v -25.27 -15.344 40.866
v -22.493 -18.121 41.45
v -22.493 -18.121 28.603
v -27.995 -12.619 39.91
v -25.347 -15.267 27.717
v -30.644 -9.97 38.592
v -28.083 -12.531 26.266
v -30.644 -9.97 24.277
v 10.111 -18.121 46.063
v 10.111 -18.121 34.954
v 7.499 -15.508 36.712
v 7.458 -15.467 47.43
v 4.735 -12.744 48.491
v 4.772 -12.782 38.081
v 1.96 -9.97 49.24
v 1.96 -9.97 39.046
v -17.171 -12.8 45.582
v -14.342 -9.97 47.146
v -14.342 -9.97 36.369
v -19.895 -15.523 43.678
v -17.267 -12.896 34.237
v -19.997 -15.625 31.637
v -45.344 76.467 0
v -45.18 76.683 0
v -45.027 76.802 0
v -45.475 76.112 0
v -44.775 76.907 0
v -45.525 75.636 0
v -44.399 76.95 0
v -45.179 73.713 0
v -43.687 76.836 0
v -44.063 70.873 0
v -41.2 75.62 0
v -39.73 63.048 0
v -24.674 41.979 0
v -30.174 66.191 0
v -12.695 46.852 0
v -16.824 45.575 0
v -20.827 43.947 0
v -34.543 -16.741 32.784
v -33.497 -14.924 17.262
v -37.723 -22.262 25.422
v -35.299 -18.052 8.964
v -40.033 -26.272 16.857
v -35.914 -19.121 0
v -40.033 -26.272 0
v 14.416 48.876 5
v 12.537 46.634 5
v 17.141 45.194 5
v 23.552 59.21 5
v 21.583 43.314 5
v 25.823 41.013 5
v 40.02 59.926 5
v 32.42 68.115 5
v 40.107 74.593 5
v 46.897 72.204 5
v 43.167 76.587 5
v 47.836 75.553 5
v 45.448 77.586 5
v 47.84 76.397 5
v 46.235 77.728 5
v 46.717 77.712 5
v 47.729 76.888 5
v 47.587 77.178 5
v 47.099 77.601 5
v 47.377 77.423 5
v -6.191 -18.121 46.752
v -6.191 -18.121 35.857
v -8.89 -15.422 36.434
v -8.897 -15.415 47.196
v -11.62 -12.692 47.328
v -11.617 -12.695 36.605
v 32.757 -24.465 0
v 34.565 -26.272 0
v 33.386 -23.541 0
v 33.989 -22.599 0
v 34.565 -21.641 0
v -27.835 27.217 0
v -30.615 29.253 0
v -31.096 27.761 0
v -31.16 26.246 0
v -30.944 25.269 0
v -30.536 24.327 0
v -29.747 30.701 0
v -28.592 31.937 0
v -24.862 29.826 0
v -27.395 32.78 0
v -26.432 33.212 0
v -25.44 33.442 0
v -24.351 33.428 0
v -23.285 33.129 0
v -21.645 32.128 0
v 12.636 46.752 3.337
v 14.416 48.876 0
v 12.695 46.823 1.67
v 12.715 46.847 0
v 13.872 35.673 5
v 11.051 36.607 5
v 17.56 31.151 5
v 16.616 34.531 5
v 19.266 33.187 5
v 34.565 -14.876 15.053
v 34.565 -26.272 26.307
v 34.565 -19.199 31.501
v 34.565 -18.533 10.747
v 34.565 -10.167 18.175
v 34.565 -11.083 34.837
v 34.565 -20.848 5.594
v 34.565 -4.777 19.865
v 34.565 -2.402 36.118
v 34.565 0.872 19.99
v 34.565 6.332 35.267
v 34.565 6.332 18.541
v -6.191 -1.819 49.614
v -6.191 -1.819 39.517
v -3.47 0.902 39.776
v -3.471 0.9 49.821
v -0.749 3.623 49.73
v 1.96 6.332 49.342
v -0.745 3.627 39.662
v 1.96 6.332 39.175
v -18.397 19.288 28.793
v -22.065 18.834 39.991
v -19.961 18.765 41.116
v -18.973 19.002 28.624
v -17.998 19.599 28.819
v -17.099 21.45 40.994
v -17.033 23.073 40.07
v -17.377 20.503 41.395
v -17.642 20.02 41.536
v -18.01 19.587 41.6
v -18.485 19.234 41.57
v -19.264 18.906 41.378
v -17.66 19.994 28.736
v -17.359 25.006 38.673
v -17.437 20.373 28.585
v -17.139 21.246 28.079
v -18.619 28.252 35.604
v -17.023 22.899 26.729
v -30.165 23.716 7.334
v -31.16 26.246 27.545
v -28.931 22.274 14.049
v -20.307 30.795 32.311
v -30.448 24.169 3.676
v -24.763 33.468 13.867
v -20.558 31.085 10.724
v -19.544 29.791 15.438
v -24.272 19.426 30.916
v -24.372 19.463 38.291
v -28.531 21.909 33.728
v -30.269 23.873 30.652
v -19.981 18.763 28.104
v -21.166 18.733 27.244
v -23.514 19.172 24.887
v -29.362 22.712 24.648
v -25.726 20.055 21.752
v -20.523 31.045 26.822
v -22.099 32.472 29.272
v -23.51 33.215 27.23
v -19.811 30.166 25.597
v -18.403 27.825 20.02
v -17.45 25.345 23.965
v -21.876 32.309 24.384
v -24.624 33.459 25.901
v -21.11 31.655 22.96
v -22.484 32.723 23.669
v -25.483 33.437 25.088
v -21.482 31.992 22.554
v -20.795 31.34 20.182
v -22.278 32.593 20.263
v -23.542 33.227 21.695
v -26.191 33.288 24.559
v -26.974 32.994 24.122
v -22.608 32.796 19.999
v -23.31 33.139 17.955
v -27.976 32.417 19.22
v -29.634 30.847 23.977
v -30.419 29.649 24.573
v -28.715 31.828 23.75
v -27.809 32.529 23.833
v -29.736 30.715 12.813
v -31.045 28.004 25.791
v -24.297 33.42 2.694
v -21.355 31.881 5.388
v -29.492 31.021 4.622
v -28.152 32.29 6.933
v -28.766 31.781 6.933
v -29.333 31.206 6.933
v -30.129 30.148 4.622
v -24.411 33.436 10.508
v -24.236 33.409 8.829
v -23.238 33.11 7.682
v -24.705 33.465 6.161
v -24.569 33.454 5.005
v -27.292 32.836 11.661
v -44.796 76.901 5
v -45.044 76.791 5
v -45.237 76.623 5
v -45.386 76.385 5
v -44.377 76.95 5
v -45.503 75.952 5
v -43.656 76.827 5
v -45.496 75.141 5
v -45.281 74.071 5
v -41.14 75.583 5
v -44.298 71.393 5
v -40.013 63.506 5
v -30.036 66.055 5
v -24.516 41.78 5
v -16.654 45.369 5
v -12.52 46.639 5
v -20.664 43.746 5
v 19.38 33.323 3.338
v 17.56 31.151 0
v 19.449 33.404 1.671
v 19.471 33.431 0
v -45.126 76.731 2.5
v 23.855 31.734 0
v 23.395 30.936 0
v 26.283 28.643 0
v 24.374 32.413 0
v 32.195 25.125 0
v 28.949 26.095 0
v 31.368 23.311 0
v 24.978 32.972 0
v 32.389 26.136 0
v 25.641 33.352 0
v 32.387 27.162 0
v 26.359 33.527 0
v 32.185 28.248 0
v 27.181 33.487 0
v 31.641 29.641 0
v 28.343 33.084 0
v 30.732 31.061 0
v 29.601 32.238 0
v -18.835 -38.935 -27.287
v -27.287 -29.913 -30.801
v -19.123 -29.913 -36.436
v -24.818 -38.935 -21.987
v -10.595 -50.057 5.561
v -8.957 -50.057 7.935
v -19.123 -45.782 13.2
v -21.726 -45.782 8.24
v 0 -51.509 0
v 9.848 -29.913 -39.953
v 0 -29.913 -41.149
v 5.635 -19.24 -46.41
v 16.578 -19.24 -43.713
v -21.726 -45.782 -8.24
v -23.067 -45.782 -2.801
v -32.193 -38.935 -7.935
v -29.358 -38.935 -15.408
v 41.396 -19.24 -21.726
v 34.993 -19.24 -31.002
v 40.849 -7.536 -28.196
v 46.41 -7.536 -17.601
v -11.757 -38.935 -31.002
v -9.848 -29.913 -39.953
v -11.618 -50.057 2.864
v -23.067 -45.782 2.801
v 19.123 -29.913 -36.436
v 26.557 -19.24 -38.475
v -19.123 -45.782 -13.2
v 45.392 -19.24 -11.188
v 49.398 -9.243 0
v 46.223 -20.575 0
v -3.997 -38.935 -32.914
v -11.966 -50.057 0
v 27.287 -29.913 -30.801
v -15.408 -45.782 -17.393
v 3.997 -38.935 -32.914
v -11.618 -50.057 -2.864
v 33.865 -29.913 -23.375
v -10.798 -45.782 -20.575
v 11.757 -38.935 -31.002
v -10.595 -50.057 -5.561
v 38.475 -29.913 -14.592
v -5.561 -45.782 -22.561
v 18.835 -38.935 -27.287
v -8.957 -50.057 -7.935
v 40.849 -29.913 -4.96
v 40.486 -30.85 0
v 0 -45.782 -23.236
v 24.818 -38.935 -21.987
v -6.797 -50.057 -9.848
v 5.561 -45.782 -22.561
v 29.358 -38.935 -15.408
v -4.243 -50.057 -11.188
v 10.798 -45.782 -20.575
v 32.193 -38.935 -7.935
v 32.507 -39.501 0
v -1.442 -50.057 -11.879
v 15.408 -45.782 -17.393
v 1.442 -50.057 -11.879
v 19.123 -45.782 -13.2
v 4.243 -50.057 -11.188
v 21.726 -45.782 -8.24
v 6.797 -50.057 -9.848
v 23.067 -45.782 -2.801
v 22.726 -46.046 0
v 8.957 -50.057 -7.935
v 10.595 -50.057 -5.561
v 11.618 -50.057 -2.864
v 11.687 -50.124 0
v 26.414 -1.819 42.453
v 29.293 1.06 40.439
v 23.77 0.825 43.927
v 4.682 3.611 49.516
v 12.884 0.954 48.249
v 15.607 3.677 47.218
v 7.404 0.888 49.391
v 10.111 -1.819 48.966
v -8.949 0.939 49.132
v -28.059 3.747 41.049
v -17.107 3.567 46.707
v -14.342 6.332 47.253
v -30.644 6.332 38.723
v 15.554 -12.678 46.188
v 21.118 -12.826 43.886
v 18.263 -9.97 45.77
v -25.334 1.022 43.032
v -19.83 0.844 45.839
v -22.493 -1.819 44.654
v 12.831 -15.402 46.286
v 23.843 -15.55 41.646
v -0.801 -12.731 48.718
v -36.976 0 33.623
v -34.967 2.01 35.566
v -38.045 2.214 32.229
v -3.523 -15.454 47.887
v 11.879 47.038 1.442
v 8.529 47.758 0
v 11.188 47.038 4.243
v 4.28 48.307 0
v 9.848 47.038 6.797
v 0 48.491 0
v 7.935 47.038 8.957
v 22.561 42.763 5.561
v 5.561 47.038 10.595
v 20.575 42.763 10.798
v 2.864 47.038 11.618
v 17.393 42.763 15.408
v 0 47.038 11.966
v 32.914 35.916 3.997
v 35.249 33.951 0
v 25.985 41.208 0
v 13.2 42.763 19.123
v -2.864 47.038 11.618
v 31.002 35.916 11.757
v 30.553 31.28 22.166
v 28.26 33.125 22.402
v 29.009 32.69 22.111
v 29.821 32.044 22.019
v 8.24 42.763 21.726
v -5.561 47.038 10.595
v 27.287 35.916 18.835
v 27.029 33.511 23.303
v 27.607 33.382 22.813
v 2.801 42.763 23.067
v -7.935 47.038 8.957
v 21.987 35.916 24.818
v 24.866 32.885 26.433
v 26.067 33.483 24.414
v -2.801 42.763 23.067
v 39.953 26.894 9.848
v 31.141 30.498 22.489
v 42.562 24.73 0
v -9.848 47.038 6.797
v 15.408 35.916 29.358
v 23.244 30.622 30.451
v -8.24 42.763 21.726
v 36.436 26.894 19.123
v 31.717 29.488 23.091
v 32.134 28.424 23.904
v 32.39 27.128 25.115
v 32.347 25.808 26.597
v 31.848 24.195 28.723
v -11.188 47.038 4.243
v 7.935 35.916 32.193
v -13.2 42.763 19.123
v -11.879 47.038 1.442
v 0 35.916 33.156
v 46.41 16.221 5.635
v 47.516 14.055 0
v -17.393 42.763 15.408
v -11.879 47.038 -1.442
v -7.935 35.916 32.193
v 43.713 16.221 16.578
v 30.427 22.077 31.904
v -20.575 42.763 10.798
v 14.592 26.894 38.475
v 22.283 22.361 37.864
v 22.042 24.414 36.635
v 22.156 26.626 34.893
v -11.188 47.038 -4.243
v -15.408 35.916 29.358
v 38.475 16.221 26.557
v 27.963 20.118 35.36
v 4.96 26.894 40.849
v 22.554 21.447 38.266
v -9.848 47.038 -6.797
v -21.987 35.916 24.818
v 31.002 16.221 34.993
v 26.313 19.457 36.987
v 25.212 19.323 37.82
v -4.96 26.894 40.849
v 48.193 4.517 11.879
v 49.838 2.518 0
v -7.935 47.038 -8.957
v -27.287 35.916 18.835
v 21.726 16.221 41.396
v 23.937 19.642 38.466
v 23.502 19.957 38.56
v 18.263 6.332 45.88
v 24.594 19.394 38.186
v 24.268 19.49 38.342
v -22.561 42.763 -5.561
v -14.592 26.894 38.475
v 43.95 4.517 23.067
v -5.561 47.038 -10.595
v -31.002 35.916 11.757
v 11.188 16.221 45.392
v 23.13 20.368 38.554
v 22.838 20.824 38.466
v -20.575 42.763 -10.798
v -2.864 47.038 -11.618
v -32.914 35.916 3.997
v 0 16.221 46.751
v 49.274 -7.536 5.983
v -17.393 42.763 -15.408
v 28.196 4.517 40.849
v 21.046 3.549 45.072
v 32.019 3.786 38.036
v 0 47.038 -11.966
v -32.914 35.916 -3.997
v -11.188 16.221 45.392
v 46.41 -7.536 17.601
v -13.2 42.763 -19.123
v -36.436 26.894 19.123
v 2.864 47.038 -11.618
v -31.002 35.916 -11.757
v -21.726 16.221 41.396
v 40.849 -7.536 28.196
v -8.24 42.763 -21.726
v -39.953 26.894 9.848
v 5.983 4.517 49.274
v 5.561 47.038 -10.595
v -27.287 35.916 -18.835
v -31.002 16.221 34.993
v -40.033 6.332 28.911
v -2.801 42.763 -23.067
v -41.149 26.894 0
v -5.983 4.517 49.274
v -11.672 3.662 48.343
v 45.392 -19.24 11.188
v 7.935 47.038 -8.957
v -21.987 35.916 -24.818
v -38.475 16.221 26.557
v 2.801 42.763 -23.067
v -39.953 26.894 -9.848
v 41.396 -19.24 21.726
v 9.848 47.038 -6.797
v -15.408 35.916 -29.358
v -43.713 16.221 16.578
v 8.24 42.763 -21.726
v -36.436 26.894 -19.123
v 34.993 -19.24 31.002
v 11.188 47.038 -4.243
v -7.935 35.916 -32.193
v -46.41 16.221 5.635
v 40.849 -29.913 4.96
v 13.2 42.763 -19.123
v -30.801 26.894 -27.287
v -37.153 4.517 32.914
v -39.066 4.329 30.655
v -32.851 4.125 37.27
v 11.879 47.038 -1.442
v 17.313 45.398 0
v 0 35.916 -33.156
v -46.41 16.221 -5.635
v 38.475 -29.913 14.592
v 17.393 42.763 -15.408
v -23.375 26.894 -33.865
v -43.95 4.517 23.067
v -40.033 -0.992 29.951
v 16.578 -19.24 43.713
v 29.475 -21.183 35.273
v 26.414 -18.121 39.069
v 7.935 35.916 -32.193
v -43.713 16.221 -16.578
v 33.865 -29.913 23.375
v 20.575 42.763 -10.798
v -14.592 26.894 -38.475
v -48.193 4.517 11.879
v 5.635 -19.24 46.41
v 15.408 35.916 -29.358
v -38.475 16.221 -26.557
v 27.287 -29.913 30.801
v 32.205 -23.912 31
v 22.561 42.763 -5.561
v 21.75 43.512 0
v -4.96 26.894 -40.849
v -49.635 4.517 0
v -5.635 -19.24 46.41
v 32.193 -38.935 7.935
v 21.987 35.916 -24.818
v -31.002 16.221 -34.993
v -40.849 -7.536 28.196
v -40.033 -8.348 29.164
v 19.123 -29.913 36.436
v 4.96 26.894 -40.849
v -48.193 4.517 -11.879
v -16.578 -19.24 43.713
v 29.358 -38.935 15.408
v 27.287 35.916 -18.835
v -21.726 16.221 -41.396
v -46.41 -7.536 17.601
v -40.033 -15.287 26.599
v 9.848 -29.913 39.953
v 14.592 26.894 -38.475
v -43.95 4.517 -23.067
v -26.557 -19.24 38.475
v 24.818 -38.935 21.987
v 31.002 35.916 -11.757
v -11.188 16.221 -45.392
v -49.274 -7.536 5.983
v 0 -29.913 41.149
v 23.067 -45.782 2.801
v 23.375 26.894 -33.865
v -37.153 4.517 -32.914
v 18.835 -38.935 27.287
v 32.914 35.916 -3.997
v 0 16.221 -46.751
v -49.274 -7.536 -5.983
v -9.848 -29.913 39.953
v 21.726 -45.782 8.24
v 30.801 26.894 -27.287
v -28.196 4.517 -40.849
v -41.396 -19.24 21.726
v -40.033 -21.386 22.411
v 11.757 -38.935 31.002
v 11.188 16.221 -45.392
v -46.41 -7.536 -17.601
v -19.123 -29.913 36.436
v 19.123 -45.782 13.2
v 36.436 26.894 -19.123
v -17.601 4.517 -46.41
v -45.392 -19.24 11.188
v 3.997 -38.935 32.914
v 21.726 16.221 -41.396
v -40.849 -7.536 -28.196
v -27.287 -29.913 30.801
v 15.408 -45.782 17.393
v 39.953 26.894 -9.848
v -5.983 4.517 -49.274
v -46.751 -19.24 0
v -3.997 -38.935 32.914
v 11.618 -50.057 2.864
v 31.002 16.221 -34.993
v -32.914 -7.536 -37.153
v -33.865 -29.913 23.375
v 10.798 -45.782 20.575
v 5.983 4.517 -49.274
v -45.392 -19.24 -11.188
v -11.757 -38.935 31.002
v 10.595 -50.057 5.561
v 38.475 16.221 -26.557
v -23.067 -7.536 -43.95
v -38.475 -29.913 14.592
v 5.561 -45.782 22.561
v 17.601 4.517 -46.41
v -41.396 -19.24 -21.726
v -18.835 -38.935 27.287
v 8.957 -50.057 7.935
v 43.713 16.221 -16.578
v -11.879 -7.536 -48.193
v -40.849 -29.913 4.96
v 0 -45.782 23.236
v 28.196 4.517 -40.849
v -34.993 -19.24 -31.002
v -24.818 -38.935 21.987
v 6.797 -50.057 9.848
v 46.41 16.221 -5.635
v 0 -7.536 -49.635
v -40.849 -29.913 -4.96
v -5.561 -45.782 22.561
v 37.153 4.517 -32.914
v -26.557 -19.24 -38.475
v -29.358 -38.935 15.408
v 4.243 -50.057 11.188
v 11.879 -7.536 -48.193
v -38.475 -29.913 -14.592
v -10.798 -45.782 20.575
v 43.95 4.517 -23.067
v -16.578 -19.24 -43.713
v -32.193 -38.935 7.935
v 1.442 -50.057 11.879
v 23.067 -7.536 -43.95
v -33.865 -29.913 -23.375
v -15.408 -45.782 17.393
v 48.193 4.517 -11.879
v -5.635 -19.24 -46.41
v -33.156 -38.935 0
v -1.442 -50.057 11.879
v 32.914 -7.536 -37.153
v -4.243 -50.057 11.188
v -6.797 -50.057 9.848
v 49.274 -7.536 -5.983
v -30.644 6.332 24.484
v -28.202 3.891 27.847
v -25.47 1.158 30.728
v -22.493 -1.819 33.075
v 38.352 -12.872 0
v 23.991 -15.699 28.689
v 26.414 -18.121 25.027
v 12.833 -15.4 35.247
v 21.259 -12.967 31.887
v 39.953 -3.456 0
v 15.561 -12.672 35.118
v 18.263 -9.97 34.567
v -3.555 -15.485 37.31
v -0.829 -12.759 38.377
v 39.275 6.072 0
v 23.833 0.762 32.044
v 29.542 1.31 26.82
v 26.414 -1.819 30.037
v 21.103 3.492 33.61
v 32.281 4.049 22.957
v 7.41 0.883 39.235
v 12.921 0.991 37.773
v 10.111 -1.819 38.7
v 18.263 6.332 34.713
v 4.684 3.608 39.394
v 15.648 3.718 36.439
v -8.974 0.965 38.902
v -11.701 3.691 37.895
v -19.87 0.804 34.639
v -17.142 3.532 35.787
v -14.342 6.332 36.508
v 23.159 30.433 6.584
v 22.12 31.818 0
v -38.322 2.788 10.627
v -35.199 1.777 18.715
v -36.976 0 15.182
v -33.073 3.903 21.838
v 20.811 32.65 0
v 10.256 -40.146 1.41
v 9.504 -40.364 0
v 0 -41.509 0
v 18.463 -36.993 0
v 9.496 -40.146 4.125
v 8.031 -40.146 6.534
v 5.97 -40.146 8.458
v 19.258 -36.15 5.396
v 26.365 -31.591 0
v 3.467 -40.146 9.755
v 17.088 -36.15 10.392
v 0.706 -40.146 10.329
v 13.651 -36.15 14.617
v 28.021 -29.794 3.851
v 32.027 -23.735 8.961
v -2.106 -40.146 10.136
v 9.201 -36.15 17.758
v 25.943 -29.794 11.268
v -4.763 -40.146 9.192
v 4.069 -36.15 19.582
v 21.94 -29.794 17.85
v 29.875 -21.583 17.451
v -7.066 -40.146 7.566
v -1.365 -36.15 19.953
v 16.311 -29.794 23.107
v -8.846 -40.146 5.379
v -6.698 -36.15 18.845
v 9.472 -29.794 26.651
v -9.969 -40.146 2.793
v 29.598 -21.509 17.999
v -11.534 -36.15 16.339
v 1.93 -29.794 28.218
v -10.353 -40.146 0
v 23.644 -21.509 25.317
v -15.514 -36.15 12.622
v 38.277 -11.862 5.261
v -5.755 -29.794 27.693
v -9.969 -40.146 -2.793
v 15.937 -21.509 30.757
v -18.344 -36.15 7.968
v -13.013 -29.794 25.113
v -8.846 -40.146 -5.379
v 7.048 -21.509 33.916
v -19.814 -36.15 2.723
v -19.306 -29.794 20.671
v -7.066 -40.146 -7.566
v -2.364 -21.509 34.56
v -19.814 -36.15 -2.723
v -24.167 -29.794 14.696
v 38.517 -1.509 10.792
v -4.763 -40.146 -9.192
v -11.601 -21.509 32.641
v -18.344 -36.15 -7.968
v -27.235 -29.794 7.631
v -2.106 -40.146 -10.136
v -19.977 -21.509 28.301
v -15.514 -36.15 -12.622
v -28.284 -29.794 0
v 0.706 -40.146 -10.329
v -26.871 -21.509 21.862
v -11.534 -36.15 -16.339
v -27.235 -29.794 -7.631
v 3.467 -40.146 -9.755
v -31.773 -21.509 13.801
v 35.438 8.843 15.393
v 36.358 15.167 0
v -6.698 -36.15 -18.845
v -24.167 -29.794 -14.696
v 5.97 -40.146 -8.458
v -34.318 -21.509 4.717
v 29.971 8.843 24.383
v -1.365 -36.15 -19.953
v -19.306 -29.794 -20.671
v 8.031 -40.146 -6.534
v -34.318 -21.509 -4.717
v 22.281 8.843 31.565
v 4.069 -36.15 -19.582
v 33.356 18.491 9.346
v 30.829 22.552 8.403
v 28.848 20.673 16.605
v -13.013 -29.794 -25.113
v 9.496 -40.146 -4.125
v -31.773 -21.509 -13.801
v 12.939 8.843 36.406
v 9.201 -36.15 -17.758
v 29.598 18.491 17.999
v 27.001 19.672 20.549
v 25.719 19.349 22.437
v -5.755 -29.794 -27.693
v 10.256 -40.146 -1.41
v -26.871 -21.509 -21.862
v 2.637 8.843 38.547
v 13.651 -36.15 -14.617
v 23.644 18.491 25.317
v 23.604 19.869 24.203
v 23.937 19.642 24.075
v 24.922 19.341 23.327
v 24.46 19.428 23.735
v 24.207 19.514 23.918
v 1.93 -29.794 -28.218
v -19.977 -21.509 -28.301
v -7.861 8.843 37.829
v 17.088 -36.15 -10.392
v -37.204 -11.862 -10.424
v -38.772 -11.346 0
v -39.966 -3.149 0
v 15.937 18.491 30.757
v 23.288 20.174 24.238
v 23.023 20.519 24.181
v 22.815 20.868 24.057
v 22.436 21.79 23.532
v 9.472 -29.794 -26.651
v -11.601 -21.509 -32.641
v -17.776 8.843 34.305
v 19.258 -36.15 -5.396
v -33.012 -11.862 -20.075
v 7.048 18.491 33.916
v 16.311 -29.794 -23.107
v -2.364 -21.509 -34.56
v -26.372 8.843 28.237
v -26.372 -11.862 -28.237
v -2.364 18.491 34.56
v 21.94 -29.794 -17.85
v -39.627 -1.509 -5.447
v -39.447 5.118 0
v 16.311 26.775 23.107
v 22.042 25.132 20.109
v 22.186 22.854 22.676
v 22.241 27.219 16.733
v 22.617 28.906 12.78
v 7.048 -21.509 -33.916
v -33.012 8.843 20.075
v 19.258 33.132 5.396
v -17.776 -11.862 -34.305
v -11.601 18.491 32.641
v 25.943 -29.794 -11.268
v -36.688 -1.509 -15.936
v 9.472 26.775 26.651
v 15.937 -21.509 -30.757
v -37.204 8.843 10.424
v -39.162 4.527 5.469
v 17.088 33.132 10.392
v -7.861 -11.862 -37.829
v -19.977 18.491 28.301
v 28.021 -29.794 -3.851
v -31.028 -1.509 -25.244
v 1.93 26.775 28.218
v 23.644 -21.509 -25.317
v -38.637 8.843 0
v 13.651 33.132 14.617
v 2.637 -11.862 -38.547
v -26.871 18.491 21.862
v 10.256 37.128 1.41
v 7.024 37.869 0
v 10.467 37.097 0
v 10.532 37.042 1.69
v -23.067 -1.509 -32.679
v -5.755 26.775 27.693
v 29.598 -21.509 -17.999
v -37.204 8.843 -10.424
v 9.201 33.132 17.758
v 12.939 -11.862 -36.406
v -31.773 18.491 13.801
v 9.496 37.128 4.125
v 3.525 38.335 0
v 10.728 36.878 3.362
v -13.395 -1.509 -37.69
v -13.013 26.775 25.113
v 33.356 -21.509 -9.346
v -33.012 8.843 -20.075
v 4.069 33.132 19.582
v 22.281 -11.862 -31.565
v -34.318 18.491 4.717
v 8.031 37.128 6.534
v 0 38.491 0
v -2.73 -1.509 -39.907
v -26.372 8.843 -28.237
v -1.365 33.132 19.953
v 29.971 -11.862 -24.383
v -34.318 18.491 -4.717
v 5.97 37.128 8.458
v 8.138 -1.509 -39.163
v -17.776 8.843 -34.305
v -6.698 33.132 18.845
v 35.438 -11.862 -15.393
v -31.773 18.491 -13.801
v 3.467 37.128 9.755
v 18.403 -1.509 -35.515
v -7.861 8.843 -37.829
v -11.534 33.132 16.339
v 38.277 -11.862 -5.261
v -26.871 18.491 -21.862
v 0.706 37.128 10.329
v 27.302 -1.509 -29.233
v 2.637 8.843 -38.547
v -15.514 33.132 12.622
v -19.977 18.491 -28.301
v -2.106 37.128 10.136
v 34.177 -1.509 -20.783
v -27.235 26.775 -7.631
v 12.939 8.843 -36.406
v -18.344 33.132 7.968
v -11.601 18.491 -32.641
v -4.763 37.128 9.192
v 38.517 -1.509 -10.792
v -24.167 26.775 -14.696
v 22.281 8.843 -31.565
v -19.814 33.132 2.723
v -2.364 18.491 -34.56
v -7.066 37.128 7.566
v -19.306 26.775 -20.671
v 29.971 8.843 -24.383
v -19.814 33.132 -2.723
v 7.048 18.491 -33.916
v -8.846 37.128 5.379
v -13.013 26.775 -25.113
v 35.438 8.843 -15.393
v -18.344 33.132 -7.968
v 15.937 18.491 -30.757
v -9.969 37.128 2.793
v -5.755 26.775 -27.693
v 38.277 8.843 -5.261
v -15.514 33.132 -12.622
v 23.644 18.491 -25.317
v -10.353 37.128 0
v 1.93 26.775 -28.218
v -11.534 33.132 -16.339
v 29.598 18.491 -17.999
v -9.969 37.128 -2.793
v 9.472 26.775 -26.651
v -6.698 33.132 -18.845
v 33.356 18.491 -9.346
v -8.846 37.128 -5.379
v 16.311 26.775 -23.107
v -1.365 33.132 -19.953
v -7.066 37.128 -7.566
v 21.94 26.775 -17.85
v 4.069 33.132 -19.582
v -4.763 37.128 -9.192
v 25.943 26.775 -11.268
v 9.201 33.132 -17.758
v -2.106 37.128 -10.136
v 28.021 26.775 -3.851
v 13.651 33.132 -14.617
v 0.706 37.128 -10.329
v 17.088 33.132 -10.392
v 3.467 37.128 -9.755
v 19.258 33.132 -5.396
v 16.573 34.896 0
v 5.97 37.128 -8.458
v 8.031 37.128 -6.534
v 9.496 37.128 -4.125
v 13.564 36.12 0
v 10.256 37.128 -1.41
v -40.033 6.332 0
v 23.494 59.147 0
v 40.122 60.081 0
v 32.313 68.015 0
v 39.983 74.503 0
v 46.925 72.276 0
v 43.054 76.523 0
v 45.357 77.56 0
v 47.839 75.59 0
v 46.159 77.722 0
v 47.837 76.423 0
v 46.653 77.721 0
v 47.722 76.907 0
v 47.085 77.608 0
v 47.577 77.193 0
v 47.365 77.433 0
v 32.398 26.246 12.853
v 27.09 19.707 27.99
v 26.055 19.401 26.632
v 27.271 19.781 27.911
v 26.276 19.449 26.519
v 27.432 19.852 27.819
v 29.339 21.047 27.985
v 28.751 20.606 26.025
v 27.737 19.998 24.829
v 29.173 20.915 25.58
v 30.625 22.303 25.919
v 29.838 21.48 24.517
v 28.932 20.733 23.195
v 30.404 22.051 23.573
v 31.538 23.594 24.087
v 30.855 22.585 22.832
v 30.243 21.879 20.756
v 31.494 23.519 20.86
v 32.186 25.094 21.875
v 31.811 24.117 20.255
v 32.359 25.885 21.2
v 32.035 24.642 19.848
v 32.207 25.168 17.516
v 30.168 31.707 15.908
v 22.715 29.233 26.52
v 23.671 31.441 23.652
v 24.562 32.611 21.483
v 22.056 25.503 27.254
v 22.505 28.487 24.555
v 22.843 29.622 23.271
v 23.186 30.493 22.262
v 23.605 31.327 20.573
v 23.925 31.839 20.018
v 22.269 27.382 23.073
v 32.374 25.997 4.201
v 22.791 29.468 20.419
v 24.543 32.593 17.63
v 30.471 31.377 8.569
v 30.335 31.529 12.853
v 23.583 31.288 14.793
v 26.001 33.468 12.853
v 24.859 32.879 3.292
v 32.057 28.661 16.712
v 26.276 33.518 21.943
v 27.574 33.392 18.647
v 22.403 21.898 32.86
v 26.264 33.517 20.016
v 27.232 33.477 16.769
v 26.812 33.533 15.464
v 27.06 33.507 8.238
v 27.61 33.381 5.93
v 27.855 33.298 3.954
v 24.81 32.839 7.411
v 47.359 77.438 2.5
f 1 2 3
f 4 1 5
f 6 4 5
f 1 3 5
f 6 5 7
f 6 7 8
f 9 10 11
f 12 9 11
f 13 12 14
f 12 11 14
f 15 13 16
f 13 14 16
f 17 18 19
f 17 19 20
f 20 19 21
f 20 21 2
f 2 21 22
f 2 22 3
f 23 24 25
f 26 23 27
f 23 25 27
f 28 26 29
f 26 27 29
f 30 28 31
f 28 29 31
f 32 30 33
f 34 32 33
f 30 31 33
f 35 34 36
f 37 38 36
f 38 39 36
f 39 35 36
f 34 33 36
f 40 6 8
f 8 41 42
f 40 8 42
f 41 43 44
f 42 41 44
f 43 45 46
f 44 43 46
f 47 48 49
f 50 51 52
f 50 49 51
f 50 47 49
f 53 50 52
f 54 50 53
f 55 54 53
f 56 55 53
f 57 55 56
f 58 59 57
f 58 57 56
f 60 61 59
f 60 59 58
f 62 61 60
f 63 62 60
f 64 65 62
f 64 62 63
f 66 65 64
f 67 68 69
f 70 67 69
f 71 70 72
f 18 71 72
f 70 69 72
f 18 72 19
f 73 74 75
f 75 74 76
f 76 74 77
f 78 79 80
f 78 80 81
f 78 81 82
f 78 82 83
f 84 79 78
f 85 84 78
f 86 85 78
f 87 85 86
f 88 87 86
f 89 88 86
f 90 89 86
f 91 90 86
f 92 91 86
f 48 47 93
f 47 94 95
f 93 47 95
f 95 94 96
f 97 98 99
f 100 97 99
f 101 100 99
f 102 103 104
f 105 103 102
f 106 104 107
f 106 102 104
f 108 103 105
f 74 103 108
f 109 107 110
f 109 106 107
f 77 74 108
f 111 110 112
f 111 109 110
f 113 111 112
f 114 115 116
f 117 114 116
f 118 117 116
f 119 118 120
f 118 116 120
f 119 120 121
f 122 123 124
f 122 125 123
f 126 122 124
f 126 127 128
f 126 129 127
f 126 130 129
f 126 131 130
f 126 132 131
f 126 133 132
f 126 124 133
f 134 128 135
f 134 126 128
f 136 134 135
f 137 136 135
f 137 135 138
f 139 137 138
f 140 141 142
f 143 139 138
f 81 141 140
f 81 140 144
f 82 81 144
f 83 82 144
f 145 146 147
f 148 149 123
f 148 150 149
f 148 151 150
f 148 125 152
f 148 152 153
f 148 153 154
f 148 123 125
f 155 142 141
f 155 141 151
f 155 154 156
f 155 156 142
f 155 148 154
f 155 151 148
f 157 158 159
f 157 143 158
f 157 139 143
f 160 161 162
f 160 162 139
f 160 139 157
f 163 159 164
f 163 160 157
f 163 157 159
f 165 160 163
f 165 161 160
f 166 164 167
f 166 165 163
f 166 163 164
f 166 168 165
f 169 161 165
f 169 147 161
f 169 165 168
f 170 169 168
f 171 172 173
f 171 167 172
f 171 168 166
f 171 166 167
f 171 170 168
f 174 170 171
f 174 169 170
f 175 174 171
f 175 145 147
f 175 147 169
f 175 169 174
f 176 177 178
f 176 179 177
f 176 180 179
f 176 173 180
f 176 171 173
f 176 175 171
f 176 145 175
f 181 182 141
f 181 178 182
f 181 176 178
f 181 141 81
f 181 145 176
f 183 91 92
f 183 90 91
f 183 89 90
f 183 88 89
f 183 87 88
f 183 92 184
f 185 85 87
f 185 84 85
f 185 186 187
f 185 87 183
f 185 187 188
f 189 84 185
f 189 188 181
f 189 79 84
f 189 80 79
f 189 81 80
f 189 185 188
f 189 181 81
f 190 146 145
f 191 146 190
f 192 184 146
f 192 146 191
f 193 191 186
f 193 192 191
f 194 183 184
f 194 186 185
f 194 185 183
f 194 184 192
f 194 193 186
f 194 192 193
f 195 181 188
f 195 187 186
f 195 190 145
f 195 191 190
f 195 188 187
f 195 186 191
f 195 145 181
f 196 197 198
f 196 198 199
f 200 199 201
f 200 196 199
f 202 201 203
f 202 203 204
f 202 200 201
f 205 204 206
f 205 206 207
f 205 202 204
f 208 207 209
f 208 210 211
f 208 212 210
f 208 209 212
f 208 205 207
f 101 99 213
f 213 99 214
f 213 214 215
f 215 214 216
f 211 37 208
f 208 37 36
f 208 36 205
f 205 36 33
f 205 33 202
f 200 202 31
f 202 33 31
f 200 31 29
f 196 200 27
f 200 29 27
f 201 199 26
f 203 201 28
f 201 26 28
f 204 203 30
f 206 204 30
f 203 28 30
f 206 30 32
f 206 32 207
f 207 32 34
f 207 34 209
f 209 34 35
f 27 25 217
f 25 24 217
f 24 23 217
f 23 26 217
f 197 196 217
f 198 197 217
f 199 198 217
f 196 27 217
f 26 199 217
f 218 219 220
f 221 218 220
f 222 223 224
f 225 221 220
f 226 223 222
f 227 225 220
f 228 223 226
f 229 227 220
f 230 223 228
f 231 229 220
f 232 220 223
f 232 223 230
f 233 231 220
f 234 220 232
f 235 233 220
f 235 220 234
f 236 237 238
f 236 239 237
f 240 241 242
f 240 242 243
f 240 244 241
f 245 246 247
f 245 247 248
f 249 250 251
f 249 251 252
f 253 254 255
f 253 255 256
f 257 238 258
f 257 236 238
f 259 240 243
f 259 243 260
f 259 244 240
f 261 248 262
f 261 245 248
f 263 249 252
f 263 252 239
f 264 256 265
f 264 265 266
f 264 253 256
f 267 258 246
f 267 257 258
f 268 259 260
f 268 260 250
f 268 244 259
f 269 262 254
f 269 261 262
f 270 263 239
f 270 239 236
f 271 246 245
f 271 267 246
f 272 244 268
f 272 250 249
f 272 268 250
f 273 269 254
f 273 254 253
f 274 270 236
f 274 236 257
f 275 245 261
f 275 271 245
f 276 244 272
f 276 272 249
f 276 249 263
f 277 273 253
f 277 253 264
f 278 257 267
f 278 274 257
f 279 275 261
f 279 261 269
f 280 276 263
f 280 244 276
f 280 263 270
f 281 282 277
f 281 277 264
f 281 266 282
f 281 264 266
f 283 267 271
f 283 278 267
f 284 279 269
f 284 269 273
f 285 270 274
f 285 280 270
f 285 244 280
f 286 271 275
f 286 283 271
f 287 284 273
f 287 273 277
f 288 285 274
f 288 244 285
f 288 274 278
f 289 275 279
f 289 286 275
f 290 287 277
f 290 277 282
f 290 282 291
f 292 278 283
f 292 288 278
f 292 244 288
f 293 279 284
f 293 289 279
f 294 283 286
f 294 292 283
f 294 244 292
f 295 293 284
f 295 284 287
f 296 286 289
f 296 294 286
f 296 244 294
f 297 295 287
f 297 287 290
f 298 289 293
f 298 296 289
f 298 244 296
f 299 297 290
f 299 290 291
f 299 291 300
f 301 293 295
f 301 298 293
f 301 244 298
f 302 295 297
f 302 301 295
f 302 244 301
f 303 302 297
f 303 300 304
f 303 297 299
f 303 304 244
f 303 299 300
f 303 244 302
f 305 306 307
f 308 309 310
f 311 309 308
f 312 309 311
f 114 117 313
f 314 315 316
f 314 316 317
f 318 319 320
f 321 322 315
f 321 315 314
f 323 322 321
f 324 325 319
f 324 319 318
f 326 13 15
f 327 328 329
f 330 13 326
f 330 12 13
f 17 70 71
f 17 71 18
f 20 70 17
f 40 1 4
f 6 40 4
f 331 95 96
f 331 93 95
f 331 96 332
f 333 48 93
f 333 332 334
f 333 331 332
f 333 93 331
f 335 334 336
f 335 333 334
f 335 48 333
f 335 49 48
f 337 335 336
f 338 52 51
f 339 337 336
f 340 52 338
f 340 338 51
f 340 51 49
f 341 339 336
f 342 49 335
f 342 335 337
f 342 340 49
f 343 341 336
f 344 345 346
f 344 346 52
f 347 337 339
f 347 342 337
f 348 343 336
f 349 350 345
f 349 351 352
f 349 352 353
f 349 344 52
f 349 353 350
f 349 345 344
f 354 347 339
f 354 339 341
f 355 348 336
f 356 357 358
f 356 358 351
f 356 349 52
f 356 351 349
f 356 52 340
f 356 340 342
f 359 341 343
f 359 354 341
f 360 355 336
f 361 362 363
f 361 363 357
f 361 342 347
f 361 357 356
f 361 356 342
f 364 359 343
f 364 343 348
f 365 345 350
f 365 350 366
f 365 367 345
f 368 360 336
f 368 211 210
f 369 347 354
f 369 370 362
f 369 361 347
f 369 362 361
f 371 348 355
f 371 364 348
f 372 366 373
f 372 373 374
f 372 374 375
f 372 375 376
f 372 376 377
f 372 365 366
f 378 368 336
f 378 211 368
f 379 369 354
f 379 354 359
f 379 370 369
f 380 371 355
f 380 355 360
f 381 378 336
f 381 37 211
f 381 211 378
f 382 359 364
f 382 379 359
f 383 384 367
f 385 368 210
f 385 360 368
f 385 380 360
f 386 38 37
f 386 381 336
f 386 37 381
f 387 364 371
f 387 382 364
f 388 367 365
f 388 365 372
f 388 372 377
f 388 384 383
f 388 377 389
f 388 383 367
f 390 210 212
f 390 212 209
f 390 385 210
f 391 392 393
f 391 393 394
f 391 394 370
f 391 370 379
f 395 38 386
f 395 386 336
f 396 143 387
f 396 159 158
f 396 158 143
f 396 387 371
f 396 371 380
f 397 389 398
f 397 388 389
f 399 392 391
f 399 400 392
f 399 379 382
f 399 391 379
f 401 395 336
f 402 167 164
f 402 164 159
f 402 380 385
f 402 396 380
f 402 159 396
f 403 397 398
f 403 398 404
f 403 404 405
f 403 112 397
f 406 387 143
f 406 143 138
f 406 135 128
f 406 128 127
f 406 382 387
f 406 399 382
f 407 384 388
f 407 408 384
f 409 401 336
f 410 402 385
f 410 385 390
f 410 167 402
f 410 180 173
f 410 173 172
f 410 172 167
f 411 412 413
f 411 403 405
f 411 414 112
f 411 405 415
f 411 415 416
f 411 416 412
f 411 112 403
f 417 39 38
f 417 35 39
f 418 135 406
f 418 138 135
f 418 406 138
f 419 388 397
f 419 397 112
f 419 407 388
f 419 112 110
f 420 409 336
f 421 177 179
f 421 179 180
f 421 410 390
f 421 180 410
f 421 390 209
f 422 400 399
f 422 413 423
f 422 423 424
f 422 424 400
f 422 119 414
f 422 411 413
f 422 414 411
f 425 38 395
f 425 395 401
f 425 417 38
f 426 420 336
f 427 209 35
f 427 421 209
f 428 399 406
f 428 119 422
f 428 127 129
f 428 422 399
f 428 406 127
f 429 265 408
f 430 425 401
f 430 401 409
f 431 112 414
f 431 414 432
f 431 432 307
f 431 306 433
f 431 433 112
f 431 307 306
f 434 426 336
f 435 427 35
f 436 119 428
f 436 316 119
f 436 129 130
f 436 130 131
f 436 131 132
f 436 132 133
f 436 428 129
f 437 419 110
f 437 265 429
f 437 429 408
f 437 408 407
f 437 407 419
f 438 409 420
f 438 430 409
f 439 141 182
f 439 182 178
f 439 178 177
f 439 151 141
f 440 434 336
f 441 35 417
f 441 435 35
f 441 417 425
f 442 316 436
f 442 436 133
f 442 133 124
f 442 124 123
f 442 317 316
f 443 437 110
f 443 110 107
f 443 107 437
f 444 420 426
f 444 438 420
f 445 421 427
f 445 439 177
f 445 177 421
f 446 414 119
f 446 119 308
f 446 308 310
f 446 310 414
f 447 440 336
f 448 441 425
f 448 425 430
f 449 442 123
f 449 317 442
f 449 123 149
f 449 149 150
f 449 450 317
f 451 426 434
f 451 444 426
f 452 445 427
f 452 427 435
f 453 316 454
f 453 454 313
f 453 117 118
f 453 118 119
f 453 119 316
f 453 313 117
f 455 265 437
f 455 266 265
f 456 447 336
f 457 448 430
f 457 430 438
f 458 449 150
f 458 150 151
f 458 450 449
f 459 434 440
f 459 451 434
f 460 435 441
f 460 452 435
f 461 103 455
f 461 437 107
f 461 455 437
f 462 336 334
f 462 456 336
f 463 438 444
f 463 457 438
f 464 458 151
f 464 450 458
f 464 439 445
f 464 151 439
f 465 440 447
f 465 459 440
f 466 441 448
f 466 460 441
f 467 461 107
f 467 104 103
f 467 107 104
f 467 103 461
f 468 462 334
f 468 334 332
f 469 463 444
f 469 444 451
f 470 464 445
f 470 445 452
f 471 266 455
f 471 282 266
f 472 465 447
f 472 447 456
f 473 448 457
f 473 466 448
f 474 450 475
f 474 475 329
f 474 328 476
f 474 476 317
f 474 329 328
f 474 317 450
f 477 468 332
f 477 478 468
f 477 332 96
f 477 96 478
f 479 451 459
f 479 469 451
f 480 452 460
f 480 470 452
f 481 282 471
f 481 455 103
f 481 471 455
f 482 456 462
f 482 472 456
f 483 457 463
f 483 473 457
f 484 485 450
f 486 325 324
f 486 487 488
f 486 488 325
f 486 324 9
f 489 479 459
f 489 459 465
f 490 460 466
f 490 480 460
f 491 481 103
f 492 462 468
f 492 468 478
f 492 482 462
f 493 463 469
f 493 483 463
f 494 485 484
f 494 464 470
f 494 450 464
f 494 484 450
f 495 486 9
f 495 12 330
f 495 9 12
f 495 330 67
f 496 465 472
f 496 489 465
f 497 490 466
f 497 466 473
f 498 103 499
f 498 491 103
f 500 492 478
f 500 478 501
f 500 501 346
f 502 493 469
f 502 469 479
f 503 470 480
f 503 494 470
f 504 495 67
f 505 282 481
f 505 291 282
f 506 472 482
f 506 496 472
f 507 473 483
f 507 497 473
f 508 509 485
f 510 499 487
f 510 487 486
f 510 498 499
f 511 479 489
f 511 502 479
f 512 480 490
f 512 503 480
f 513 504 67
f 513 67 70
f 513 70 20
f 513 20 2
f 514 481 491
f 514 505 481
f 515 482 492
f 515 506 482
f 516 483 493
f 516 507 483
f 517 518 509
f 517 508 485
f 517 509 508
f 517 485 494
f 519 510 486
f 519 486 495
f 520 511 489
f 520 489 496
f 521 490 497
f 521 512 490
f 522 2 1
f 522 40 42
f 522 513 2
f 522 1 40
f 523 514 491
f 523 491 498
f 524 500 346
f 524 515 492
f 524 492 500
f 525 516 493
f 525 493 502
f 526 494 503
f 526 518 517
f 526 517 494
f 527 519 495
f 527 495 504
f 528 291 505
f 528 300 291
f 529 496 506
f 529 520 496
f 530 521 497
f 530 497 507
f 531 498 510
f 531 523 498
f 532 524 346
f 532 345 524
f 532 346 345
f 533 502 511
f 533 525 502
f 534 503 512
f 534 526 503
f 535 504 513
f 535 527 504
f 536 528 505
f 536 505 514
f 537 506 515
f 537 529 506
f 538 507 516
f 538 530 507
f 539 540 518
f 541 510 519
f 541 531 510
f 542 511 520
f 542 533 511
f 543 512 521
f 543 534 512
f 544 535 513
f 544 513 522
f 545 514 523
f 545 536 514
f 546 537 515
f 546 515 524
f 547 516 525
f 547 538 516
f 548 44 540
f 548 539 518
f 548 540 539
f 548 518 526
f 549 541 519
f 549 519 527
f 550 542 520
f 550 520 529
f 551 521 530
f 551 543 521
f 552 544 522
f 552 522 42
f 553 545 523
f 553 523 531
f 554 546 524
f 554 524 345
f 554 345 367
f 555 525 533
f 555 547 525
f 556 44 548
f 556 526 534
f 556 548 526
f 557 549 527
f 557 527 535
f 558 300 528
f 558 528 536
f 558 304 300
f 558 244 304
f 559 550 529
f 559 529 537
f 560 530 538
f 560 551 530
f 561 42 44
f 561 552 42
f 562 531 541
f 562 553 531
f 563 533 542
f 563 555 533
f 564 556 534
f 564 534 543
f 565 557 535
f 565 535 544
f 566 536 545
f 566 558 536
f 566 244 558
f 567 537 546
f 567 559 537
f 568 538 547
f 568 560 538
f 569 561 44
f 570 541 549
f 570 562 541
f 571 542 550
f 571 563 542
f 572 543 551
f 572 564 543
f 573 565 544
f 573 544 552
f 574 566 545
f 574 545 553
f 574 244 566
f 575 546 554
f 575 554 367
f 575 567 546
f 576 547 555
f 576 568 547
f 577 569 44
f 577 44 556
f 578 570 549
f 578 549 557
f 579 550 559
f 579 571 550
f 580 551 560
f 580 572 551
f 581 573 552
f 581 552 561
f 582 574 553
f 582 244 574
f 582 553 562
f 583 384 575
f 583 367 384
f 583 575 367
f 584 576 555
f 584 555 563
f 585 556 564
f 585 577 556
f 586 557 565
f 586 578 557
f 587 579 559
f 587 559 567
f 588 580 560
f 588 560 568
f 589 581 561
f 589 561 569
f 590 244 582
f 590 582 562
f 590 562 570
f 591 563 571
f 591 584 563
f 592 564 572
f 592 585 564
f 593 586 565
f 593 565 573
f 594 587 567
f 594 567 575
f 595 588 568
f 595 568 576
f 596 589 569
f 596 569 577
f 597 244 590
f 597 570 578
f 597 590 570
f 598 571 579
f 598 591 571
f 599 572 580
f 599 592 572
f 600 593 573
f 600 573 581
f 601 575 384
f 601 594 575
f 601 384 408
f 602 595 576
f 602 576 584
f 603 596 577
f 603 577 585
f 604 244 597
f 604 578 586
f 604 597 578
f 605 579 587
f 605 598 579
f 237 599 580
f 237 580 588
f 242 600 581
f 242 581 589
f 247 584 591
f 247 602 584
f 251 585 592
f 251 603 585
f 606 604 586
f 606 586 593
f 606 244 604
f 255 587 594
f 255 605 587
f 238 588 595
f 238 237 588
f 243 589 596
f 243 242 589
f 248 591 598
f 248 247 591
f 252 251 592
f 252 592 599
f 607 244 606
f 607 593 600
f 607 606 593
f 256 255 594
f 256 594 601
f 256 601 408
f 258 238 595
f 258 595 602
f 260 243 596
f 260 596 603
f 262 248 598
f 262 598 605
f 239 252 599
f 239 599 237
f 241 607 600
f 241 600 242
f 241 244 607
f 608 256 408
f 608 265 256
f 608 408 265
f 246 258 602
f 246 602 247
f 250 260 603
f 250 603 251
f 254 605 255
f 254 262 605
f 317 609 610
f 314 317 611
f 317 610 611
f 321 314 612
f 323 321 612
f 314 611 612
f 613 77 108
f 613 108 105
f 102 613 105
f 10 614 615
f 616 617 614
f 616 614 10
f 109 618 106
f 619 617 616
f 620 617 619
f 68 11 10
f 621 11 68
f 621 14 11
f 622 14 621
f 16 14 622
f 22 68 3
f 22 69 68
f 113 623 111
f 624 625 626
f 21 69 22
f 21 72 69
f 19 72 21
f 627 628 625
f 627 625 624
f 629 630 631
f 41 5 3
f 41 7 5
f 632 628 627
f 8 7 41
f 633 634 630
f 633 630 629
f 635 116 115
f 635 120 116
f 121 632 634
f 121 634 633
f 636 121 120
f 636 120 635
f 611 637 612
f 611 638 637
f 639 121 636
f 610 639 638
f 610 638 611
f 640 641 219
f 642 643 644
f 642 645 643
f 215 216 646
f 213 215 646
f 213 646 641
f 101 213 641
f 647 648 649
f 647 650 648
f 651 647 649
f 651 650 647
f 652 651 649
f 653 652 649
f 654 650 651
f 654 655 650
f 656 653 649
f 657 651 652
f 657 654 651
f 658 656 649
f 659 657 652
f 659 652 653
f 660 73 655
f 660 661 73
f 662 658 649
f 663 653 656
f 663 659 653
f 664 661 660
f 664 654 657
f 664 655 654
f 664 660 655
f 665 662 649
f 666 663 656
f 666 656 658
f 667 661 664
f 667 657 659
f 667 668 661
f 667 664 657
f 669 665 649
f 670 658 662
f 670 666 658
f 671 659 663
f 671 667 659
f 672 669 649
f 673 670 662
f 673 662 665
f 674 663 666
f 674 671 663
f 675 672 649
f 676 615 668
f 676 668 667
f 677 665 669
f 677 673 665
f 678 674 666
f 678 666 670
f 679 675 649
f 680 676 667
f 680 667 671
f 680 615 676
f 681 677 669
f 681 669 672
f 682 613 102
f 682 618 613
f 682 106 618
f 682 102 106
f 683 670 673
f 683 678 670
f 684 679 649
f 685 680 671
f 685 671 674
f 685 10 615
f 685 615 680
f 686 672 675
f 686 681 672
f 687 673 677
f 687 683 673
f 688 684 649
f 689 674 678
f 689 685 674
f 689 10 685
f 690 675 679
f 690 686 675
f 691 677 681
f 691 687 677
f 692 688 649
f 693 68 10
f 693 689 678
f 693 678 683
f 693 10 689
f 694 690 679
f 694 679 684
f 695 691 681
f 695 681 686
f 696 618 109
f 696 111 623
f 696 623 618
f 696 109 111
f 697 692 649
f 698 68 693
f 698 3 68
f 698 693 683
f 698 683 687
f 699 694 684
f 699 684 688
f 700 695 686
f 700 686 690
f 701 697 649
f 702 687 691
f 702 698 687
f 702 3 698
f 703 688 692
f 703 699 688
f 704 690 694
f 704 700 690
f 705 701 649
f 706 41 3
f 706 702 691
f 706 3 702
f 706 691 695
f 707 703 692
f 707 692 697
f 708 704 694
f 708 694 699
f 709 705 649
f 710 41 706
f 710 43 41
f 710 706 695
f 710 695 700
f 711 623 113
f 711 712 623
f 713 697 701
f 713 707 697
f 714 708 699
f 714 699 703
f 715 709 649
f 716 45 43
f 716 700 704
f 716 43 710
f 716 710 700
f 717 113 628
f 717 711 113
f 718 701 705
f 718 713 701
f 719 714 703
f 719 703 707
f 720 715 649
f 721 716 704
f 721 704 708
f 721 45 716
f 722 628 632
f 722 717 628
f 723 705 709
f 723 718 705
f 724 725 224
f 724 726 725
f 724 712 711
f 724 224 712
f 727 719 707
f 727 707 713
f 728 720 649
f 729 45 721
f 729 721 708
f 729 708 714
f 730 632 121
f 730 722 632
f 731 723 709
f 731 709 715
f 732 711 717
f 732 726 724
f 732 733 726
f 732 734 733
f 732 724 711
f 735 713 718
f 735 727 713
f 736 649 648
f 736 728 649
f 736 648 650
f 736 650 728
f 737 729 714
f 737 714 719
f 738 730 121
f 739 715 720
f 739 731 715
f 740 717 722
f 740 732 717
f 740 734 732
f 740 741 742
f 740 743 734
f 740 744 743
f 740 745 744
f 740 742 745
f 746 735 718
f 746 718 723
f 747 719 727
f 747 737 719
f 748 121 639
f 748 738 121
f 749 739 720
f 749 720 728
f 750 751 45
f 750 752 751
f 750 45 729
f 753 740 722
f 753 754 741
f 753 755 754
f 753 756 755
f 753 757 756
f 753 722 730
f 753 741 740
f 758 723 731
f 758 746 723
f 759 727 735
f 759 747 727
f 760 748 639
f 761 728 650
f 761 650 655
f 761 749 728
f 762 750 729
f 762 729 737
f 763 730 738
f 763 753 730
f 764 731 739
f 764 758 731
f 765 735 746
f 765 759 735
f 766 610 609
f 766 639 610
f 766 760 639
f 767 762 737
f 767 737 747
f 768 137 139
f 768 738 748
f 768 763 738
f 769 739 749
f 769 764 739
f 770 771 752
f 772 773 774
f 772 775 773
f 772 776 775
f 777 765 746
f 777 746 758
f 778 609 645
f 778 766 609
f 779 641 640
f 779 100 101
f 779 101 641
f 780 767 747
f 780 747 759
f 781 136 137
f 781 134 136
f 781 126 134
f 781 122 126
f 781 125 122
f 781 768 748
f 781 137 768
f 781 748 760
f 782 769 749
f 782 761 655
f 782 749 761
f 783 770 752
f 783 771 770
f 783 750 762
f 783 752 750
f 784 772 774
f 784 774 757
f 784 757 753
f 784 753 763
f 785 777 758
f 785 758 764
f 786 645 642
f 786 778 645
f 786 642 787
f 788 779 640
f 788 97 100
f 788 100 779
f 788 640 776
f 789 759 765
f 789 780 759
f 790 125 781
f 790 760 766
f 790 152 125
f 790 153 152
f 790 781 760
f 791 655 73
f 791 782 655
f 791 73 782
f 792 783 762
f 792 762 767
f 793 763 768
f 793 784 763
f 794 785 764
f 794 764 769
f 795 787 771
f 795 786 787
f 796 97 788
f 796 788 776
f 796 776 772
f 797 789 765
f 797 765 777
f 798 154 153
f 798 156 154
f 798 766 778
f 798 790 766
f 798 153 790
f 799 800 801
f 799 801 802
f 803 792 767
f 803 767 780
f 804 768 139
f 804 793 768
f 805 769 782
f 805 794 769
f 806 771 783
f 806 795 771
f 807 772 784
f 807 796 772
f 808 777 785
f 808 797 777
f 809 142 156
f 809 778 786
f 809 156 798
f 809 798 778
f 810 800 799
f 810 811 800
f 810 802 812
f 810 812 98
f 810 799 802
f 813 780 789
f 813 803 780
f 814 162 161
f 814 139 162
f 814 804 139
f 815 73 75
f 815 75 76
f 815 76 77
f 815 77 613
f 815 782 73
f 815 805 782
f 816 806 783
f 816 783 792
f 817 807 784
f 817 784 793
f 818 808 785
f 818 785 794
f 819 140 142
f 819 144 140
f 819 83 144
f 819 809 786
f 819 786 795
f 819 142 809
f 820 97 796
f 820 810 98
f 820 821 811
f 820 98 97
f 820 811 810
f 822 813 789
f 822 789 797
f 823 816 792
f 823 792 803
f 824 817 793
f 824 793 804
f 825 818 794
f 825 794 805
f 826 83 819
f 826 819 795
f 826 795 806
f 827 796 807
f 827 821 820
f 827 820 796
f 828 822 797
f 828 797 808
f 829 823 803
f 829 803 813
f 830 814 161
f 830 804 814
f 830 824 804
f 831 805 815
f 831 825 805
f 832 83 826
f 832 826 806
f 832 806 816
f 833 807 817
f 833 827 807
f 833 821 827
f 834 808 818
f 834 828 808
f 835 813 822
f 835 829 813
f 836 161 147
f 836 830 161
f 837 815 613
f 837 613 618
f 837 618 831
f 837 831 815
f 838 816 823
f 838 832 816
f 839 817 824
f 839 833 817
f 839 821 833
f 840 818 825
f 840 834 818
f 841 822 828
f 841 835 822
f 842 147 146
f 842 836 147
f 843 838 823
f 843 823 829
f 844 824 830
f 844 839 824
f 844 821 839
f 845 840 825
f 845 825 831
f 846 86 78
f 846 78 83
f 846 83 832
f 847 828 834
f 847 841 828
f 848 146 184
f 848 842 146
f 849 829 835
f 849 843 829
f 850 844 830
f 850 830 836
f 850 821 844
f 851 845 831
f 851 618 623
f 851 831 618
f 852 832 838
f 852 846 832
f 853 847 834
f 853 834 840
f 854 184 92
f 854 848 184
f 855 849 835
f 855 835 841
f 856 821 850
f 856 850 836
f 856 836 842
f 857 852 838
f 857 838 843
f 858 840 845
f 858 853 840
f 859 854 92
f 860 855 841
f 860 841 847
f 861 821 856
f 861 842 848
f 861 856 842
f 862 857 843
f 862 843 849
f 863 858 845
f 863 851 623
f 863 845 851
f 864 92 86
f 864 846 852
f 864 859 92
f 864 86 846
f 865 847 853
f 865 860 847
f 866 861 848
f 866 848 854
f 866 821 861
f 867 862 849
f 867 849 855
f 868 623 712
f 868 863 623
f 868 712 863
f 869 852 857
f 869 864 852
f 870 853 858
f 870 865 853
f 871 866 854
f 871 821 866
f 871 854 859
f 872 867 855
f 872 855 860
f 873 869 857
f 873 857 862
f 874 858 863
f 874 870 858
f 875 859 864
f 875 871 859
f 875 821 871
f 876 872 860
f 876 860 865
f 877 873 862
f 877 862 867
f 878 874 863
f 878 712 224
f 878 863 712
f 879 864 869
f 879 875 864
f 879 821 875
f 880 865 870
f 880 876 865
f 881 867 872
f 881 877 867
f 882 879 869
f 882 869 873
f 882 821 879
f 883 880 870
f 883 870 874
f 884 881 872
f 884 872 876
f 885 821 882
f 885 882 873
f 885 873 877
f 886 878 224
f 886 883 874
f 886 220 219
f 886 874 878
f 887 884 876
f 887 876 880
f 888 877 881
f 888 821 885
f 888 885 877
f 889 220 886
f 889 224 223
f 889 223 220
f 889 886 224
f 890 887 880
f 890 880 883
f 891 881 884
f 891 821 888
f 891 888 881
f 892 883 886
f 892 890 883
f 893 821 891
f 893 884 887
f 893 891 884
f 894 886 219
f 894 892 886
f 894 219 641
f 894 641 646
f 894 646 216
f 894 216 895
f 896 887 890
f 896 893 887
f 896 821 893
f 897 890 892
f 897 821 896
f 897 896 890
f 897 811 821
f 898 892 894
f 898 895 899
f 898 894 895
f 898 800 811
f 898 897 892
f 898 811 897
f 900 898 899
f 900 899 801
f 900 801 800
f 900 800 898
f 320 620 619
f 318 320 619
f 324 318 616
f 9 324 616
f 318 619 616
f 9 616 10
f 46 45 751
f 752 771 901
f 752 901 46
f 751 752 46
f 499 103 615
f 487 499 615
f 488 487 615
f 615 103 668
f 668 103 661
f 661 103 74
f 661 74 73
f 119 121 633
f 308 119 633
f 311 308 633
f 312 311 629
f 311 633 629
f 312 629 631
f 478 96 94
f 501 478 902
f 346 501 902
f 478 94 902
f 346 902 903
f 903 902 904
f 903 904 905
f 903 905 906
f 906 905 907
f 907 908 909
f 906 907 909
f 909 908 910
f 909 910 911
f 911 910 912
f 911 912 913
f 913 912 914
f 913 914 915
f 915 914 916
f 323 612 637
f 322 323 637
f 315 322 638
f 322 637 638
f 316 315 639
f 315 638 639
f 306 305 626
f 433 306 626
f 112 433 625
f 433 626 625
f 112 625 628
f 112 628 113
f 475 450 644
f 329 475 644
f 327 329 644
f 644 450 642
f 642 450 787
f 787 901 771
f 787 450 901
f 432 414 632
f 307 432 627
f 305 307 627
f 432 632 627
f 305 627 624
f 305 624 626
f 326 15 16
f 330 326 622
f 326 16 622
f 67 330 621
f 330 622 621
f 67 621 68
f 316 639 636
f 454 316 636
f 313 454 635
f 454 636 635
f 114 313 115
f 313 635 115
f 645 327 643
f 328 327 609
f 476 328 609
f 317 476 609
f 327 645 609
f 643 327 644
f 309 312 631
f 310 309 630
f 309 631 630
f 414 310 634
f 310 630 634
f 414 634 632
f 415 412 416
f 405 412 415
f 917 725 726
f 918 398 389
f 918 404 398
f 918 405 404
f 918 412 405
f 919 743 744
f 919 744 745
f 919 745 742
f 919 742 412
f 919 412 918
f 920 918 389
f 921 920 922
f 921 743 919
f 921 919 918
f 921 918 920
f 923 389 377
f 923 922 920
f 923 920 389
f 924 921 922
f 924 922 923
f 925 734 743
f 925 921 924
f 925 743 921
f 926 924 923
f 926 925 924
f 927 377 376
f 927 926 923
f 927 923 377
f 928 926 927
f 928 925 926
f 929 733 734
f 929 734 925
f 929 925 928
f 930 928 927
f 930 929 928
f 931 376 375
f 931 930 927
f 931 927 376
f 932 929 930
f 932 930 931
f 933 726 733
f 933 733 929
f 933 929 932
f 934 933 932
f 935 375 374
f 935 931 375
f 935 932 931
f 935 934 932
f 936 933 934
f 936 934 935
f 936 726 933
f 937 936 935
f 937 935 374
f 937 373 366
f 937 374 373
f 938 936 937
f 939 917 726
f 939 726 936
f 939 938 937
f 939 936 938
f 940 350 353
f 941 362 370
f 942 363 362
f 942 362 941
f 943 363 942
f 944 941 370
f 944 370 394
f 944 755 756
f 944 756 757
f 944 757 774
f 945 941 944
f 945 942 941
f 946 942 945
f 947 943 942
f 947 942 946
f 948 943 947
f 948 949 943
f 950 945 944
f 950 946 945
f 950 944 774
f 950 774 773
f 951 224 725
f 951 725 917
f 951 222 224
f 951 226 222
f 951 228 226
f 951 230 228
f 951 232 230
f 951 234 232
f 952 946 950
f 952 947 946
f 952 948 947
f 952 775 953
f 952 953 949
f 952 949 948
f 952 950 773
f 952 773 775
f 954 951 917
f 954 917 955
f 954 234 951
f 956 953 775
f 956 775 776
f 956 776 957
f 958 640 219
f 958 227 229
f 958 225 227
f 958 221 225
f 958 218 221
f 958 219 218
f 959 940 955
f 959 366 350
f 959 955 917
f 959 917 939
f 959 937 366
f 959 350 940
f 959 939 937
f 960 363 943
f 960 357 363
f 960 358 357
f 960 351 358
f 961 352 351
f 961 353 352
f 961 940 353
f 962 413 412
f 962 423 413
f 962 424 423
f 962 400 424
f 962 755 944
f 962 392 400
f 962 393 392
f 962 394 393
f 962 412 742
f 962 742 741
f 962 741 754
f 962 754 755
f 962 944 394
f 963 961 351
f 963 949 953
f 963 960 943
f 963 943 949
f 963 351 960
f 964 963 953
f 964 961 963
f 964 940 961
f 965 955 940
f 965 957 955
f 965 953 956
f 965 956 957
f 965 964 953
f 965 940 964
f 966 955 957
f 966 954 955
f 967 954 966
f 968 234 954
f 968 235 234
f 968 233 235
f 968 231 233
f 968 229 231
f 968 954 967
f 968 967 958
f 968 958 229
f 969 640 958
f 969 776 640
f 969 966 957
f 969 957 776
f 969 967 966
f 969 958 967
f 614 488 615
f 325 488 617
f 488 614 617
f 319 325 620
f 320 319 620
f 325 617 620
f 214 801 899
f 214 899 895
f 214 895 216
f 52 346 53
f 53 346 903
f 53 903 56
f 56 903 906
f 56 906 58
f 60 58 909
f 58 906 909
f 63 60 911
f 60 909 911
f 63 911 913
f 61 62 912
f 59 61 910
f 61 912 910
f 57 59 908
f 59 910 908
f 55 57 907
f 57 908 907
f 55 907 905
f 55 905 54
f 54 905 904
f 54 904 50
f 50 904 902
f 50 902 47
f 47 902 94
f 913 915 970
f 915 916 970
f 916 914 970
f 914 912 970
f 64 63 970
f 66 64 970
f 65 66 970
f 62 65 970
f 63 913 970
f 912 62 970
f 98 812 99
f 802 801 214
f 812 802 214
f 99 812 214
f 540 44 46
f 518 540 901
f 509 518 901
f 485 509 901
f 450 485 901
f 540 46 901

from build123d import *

# Parameters (mm, degrees)
CUT_EXTRUDE1_DEPTH  = 50
CUT_EXTRUDE2_DEPTH  = 50
BOSS_EXTRUDE1_DEPTH = 5
BOSS_EXTRUDE2_DEPTH = 5


with BuildPart() as part:
    # Sketch4 → Revolve-Thin1 (revolve)
    with BuildSketch(Plane.XY):
        with BuildLine():
            ThreePointArc((0, 48.490566038), (50, -1.509433962), (0, -51.509433962))
            Line((0, -51.509433962), (0, -41.509433962))
            ThreePointArc((0, -41.509433962), (40, -1.509433962), (0, 38.490566038))
            Line((0, 38.490566038), (0, 48.490566038))
        make_face()
    revolve(axis=Axis((0, 48.490566038, 0), (0, -1, 0)))

    # Sketch5 → Cut-Extrude1 (cut)
    with BuildSketch(Plane.XY):
        Polygon((-30.644001245, -9.970067303), (-40.033240684, -26.272263251), (-40.033240684, 6.332128646), (-36.976129891, 0), (-30.644001245, 6.332128646), (-22.492903271, -1.818969328), (-14.341805297, 6.332128646), (-6.190707322, -1.818969328), (1.960390652, 6.332128646), (10.111488626, -1.818969328), (18.262586601, 6.332128646), (26.413684575, -1.818969328), (34.56478255, 6.332128646), (34.56478255, -9.970067303), (34.56478255, -26.272263251), (26.413684575, -18.121165277), (18.262586601, -9.970067303), (10.111488626, -18.121165277), (1.960390652, -9.970067303), (-6.190707322, -18.121165277), (-14.341805297, -9.970067303), (-22.492903271, -18.121165277), align=None)
    extrude(amount=CUT_EXTRUDE1_DEPTH, mode=Mode.SUBTRACT)

    # Sketch6 → Cut-Extrude2 (cut)
    with BuildSketch(Plane.XY):
        with BuildLine():
            add(Edge.make_bspline(
                [(-31.159893522, 26.245570533), (-30.561812418, 20.967271985), (-10.609739532, 12.440512153), (-22.402808053, 39.879513697), (-31.550689585, 29.694497906), (-31.159893522, 26.245570533)],
                knots=[0, 0, 0, 0, 0.370756889, 0.75774133, 1, 1, 1, 1], degree=3))
        make_face()
        with BuildLine():
            add(Edge.make_bspline(
                [(23.937401646, 19.642149389), (26.561792049, 18.17132991), (37.050887315, 25.488164902), (23.054790304, 40.061439696), (20.519151547, 21.557881447), (23.937401646, 19.642149389)],
                knots=[0, 0, 0, 0, 0.312357954, 0.593155955, 1, 1, 1, 1], degree=3))
        make_face()
    extrude(amount=CUT_EXTRUDE2_DEPTH, mode=Mode.SUBTRACT)

    # Sketch8 → Boss-Extrude1 (add)
    with BuildSketch(Plane.XY):
        with BuildLine():
            Line((-21.178417491, 37.628203487), (-11.569674779, 45.482179937))
            add(Edge.make_bspline(
                [(-11.569674779, 45.482179937), (-40.321950535, 80.658402053), (-45.12632189, 76.731413828), (-49.930693246, 72.804425603), (-21.178417491, 37.628203487)],
                knots=[4.71238898, 4.71238898, 4.71238898, 6.283185307, 6.283185307, 7.853981634, 7.853981634, 7.853981634], degree=2, weights=[1, 0.707106781, 1, 0.707106781, 1]))
        make_face()
    extrude(amount=BOSS_EXTRUDE1_DEPTH)

    # Sketch9 → Boss-Extrude2 (add)
    with BuildSketch(Plane.XY):
        with BuildLine():
            Line((14.416361682, 48.876227224), (6.987253857, 40.013654036))
            Line((6.987253857, 40.013654036), (17.559883218, 31.151080848))
            Line((17.559883218, 31.151080848), (24.988991043, 40.013654036))
            add(Edge.make_bspline(
                [(24.988991043, 40.013654036), (52.645598361, 73.0066745), (47.35928368, 77.437961094), (42.072969, 81.869247688), (14.416361682, 48.876227224)],
                knots=[4.71238898, 4.71238898, 4.71238898, 6.283185307, 6.283185307, 7.853981634, 7.853981634, 7.853981634], degree=2, weights=[1, 0.707106781, 1, 0.707106781, 1]))
        make_face()
    extrude(amount=BOSS_EXTRUDE2_DEPTH)


solid = part.part
